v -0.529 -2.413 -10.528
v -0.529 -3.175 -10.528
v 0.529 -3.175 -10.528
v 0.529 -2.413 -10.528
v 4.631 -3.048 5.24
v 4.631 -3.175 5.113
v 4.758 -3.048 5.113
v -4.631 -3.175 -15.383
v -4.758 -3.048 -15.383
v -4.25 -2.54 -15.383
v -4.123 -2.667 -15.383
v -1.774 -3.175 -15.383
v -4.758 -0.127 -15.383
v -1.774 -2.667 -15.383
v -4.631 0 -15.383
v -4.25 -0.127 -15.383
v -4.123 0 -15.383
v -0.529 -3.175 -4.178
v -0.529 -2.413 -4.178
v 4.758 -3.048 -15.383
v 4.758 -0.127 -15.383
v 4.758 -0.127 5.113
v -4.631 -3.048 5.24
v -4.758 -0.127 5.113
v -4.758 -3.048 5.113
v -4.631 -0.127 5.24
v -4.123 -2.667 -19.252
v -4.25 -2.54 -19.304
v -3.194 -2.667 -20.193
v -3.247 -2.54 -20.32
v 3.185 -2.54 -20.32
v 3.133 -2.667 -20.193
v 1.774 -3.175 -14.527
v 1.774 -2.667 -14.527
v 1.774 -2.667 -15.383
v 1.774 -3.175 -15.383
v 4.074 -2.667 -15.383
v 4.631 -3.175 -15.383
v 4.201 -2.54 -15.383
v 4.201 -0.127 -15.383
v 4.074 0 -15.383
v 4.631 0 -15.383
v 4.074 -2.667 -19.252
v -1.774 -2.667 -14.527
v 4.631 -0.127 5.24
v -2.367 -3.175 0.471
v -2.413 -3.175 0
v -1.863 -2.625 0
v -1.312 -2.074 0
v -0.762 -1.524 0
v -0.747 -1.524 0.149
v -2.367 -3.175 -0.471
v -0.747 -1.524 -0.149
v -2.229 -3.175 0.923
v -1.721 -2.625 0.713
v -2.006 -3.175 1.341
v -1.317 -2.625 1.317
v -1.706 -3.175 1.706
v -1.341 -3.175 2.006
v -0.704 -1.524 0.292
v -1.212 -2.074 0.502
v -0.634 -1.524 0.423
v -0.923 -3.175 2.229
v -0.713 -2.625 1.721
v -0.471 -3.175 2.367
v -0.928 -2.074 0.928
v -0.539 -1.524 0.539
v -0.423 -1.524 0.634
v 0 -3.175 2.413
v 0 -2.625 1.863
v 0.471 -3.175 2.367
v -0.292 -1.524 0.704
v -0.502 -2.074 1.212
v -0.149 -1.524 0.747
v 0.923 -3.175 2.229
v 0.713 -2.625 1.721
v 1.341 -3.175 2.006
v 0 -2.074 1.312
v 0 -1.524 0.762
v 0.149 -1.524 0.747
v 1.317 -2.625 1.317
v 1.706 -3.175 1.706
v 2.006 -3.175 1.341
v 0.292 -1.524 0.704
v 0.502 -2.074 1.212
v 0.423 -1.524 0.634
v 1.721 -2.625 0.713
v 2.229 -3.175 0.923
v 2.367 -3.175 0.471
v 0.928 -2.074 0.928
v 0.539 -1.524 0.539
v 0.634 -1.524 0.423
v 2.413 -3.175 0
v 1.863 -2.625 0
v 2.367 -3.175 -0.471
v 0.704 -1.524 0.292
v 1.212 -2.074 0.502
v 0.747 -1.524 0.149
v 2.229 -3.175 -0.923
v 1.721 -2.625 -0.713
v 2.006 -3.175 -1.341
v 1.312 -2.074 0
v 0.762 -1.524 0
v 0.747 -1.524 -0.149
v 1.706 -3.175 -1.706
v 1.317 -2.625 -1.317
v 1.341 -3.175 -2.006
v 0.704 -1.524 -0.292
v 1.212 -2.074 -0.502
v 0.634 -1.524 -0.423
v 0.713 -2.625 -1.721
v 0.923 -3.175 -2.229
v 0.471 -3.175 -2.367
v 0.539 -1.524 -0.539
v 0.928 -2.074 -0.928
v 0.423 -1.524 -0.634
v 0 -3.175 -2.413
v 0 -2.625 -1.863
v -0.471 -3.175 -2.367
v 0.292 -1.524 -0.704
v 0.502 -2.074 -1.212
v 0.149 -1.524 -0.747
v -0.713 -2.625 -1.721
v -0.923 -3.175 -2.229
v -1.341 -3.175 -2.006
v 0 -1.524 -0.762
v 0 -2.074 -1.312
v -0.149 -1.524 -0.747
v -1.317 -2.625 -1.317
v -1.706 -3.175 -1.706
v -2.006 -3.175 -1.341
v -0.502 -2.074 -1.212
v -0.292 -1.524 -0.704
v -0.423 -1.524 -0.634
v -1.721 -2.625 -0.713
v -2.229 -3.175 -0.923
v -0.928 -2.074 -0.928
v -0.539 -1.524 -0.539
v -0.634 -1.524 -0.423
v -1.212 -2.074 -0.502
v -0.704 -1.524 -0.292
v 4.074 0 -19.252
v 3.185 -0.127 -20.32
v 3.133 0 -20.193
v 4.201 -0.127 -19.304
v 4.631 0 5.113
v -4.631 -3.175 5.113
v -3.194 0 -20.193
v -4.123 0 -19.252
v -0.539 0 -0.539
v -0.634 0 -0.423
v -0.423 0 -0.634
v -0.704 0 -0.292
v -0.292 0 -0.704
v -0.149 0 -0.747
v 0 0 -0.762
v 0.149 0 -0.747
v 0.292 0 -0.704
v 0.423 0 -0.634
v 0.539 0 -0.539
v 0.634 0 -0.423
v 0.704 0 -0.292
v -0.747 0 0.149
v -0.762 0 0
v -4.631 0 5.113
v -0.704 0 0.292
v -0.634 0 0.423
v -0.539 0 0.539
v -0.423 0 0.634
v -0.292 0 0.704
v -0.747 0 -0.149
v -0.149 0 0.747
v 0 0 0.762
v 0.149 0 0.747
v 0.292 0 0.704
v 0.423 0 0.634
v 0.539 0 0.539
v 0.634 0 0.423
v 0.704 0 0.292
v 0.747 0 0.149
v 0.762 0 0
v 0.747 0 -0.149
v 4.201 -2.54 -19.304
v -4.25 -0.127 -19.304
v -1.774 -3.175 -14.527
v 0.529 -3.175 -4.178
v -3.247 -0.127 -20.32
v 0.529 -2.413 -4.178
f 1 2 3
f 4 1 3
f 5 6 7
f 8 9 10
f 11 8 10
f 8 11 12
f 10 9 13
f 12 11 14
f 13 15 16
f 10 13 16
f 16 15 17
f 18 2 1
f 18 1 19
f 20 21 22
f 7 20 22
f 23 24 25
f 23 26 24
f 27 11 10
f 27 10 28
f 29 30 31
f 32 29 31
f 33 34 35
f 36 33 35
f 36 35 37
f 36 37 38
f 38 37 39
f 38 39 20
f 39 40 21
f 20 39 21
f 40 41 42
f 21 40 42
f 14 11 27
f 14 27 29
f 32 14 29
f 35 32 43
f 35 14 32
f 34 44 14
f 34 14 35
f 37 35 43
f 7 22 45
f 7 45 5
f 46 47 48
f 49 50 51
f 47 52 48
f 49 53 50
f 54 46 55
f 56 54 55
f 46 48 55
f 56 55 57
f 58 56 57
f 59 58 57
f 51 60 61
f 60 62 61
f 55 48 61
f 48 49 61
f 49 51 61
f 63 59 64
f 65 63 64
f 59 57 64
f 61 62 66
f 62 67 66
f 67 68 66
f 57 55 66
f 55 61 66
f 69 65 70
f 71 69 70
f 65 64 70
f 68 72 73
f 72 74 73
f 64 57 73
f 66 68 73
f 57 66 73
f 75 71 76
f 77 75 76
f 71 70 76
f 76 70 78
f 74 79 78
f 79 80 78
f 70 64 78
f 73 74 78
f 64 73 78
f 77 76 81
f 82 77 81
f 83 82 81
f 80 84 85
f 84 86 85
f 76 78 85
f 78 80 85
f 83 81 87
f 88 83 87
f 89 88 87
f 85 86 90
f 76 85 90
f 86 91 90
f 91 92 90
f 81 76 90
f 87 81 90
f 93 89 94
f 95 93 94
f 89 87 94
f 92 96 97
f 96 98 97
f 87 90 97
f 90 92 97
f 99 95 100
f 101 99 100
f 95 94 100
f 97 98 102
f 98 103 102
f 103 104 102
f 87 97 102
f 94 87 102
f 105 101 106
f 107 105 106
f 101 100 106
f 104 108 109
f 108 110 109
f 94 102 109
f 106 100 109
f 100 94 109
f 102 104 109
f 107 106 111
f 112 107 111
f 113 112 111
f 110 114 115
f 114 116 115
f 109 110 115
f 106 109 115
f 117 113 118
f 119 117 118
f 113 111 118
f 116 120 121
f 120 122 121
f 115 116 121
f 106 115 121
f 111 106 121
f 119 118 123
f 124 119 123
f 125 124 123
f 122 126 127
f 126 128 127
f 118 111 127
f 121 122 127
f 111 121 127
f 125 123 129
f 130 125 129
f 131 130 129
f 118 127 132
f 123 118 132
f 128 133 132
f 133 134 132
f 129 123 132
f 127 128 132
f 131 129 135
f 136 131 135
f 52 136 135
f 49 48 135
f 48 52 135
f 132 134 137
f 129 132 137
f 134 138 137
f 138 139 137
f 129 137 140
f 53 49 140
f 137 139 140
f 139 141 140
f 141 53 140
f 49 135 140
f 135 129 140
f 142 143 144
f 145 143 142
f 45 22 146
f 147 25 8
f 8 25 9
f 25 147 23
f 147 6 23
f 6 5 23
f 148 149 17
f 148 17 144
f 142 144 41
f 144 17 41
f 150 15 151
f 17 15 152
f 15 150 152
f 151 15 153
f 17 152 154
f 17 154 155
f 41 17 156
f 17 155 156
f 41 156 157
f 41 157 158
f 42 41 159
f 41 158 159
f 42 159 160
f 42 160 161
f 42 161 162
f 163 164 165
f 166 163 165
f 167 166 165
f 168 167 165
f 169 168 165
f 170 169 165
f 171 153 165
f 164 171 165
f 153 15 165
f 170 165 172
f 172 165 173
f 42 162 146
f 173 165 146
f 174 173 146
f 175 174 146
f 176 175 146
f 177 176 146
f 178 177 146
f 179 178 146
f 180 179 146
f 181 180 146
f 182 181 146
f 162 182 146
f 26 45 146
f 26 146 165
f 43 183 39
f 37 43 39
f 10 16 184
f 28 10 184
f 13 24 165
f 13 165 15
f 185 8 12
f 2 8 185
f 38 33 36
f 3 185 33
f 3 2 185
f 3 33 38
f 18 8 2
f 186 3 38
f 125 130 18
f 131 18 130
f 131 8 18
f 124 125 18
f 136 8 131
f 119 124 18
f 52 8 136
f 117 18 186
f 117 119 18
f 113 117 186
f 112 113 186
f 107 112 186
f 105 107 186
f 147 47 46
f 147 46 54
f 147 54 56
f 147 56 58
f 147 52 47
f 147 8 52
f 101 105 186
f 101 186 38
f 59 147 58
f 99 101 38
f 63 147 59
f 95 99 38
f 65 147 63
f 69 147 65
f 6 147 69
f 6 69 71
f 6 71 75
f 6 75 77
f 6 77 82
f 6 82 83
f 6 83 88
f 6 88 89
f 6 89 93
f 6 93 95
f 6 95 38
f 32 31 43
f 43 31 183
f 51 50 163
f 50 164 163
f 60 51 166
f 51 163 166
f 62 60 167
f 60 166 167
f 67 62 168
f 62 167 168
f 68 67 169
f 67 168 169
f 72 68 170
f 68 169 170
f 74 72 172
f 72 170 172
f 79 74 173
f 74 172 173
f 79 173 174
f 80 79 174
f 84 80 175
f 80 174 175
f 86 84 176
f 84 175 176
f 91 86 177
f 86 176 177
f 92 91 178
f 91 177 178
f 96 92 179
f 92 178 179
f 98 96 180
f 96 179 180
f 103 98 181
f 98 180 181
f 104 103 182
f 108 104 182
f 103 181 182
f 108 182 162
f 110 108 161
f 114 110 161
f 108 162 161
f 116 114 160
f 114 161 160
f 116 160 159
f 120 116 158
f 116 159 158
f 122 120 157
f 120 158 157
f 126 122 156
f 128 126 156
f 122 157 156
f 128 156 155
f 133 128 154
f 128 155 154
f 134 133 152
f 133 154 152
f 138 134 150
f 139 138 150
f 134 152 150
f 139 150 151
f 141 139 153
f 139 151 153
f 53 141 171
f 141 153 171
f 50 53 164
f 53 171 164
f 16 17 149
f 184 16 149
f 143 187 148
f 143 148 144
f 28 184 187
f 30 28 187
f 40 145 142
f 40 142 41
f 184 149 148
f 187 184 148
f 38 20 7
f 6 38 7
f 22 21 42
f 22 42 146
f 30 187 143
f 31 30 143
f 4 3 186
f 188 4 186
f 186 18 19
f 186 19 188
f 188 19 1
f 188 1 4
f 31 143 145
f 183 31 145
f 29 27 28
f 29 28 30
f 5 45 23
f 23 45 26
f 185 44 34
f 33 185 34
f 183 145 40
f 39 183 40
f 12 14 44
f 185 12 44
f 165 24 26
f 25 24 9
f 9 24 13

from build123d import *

# Parameters (mm, degrees)
F1_DEPTH       = 3.175
F3_DEPTH       = 2.667
F4_SIZE        = 0.127
F5_D           = 1.524
F5_CSINK_D     = 4.826
F5_CSINK_ANGLE = 90
F6_W           = 1.058334
F6_H           = 6.35
F7_DEPTH       = 0.762


with BuildPart() as f1:
    # F0 (on Front) → F1 (new body)
    with BuildSketch(Plane.XZ):
        Polygon((4.758054, 5.239753), (-4.758054, 5.239753), (-4.758054, -15.383445), (-4.250054, -15.383445), (-1.773554, -15.383445), (-1.773554, -14.527198), (1.773554, -14.527198), (1.773554, -15.383445), (4.201267, -15.383445), (4.758054, -15.383445), align=None)
    extrude(amount=F1_DEPTH)

    # F0 (on Front) → F3 (join)
    with BuildSketch(Plane.XZ):
        Polygon((-1.773554, -15.383445), (-4.250054, -15.383445), (-4.250054, -19.304393), (-3.246823, -20.32), (3.185267, -20.32), (4.201267, -19.304393), (4.201267, -15.383445), (1.773554, -15.383445), (1.773554, -14.527198), (-1.773554, -14.527198), align=None)
    extrude(amount=F3_DEPTH)

    # F4
    f4_edges = [f1.edges().sort_by_distance(p)[0] for p in [
        (0, -3.175, 5.239753),
        (-4.758054, -3.175, -5.071846),
        (-4.758054, -1.5875, 5.239753),
        (-4.758054, 0, -5.071846),
        (4.758054, -3.175, -5.071846),
        (4.758054, 0, -5.071846),
        (4.758054, -1.5875, 5.239753),
        (0, 0, 5.239753),
        (-4.250054, -2.667, -17.343919),
        (4.201267, -2.667, -17.343919),
        (4.201267, 0, -17.343919),
        (-4.250054, 0, -17.343919),
        (3.693267, -2.667, -19.812197),
        (-0.030778, -2.667, -20.32),
        (-3.748439, -2.667, -19.812197),
        (-3.748439, 0, -19.812197),
        (-0.030778, 0, -20.32),
        (3.693267, 0, -19.812197),
    ]]
    chamfer(f4_edges, length=F4_SIZE)

    # F5 (through all)
    with Locations(Plane.XZ.offset(3.175)):
        with Locations((0, 0)):
            CounterSinkHole(F5_D / 2, F5_CSINK_D / 2, counter_sink_angle=F5_CSINK_ANGLE)

    # F6 (on face) → F7 (cut)
    with BuildSketch(Plane.XZ.offset(3.175)):
        with Locations((0, -7.352567)):
            Rectangle(F6_W, F6_H)
    extrude(amount=-F7_DEPTH, mode=Mode.SUBTRACT)


solid = f1.part
